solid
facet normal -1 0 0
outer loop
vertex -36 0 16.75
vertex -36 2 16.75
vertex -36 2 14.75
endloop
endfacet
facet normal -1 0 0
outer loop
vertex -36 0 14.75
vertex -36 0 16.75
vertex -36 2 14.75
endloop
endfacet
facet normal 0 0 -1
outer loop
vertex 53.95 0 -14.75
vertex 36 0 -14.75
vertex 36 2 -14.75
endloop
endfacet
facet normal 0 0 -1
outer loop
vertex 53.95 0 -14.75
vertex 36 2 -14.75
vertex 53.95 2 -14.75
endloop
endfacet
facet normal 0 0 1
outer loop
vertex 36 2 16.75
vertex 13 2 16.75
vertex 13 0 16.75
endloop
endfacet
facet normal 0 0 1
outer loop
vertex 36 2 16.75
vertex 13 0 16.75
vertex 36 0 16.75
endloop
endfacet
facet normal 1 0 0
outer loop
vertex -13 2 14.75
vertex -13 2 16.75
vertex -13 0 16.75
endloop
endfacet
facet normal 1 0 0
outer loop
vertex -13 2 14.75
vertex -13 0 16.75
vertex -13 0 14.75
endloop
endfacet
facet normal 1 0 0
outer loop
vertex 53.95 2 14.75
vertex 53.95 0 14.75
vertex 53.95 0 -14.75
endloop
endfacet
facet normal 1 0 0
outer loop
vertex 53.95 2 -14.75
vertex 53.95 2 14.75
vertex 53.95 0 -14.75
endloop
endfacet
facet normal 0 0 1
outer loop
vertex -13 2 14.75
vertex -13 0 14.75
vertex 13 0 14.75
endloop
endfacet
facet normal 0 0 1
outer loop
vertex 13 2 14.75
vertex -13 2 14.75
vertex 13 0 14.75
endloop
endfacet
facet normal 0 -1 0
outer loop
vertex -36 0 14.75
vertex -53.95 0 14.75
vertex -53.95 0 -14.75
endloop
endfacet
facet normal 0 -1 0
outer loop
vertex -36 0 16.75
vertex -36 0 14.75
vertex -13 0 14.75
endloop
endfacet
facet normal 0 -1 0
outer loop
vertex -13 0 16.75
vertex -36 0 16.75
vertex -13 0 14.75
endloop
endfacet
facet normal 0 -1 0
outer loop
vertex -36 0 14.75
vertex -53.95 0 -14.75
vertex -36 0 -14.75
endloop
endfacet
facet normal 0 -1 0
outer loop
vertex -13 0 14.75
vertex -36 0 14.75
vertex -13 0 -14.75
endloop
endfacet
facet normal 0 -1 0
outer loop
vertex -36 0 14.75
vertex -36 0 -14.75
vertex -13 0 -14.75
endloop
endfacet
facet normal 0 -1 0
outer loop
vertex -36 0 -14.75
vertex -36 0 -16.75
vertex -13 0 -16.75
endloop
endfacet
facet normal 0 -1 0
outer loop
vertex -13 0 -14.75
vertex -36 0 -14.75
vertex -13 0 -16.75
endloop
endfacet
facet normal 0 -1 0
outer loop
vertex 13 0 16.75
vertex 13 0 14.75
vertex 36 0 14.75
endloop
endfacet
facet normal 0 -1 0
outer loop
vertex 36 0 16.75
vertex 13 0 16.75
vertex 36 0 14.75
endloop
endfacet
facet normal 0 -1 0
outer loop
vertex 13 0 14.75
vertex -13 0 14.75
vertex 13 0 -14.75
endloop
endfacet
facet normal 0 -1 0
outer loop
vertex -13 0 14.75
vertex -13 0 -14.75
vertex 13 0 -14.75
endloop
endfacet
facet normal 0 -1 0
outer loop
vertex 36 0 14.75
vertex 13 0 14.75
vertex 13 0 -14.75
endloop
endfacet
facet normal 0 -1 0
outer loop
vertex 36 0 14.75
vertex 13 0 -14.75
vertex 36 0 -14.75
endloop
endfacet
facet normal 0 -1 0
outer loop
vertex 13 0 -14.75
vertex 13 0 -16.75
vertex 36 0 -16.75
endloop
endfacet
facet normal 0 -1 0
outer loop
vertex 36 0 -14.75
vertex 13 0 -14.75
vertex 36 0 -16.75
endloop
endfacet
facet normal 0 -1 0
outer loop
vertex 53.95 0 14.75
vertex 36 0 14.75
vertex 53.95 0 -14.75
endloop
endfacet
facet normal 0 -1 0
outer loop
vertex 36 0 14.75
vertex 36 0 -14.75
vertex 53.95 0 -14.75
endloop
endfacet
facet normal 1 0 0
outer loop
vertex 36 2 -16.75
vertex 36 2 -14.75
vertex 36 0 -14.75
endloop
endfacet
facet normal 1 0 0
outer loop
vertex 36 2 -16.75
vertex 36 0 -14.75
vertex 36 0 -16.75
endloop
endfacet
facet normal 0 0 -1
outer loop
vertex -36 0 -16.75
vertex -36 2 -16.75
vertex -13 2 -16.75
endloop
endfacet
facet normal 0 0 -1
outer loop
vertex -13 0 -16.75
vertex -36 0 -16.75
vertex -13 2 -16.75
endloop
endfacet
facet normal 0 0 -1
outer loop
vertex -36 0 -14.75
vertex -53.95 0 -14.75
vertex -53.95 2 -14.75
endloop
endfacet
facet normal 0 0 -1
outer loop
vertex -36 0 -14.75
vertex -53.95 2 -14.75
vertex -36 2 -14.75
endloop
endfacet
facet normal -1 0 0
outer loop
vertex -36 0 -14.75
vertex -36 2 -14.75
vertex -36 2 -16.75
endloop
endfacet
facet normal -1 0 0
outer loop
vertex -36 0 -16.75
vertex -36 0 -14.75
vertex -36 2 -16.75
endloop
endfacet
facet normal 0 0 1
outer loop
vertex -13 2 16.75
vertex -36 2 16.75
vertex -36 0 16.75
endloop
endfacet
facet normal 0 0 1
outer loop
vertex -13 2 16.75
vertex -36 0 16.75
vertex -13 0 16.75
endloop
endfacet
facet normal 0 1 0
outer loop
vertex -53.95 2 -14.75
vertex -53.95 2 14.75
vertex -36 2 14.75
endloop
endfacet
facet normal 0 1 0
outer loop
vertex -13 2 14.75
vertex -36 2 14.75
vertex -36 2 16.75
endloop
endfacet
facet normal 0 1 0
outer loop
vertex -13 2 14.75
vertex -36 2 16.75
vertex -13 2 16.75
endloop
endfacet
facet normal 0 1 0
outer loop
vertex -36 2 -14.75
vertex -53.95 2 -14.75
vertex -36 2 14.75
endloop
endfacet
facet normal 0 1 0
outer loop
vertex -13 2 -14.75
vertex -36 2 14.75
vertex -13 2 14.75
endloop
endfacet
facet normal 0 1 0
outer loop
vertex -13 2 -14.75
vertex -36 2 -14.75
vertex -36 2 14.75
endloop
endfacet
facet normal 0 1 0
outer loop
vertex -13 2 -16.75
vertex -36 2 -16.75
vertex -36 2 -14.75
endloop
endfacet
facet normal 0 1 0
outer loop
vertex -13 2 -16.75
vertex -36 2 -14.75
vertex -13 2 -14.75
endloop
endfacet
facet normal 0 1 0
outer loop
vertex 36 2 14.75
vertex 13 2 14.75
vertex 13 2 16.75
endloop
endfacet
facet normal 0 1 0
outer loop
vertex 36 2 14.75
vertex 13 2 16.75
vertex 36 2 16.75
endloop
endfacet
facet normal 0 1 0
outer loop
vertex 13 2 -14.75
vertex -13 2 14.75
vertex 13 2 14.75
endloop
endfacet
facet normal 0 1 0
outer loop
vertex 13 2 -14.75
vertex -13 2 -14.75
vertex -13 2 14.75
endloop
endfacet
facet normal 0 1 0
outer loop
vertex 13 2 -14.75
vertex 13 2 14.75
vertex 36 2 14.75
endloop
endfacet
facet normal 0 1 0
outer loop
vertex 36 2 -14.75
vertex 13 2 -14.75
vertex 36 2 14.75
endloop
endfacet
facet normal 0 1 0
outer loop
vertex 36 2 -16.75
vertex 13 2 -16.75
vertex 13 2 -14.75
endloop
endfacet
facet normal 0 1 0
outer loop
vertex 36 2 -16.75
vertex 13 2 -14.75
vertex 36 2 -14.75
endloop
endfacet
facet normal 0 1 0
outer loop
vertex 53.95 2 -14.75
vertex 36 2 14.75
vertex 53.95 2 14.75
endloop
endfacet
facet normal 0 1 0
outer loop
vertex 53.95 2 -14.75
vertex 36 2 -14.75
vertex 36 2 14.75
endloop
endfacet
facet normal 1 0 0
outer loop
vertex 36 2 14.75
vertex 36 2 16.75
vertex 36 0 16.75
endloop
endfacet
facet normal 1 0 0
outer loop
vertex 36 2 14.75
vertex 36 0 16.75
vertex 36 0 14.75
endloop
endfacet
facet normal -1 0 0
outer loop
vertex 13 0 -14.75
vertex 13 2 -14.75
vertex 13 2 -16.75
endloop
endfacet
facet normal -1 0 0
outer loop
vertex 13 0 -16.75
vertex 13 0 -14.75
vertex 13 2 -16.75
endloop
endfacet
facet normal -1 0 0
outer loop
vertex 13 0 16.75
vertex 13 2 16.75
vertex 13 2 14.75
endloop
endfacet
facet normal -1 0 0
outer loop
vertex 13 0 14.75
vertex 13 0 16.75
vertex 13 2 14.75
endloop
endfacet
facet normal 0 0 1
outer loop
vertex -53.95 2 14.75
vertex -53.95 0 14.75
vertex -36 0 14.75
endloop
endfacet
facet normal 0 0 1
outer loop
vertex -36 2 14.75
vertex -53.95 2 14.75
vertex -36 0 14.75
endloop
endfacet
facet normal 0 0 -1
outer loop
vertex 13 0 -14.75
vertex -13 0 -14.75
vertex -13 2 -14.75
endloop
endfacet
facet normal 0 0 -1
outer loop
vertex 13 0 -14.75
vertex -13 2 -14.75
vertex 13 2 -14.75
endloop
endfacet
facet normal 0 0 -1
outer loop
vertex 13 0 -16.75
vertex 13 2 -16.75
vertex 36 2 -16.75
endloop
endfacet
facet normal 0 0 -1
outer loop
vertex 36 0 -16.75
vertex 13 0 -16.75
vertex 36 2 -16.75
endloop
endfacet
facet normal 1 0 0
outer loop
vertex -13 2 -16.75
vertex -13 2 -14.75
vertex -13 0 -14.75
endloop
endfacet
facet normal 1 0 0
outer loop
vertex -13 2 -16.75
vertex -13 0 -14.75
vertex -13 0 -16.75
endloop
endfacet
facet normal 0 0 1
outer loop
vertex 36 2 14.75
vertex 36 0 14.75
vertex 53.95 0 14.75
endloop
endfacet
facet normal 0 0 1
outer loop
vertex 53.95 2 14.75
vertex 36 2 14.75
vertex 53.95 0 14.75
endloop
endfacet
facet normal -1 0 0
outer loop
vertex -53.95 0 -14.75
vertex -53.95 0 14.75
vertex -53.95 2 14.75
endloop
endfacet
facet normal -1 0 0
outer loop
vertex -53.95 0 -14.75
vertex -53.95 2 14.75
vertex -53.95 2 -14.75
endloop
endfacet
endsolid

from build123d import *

# Parameters (mm, degrees)
SKETCH_1_W      = 107.9
SKETCH_1_H      = 29.5
EXTRUDE_1_DEPTH = 2
SKETCH_2_W      = 23
SKETCH_2_H      = 2
EXTRUDE_2_DEPTH = 2


with BuildPart() as part:
    # 草图1 → 凸台-拉伸1 (new body)
    with BuildSketch(Plane(origin=(0, 0, 0), x_dir=(1, 0, 0), z_dir=(0, 1, 0))):
        Rectangle(SKETCH_1_W, SKETCH_1_H)
    extrude(amount=EXTRUDE_1_DEPTH)

    # 草图2 → 凸台-拉伸2 (add)
    with BuildSketch(Plane(origin=(0, 2, 0), x_dir=(1, 0, 0), z_dir=(0, 1, 0))):
        with Locations((-24.5, 15.75)):
            Rectangle(SKETCH_2_W, SKETCH_2_H)
        with Locations((24.5, 15.75)):
            Rectangle(SKETCH_2_W, SKETCH_2_H)
        with Locations((24.5, -15.75)):
            Rectangle(SKETCH_2_W, SKETCH_2_H)
        with Locations((-24.5, -15.75)):
            Rectangle(SKETCH_2_W, SKETCH_2_H)
    extrude(amount=-EXTRUDE_2_DEPTH)


solid = part.part
